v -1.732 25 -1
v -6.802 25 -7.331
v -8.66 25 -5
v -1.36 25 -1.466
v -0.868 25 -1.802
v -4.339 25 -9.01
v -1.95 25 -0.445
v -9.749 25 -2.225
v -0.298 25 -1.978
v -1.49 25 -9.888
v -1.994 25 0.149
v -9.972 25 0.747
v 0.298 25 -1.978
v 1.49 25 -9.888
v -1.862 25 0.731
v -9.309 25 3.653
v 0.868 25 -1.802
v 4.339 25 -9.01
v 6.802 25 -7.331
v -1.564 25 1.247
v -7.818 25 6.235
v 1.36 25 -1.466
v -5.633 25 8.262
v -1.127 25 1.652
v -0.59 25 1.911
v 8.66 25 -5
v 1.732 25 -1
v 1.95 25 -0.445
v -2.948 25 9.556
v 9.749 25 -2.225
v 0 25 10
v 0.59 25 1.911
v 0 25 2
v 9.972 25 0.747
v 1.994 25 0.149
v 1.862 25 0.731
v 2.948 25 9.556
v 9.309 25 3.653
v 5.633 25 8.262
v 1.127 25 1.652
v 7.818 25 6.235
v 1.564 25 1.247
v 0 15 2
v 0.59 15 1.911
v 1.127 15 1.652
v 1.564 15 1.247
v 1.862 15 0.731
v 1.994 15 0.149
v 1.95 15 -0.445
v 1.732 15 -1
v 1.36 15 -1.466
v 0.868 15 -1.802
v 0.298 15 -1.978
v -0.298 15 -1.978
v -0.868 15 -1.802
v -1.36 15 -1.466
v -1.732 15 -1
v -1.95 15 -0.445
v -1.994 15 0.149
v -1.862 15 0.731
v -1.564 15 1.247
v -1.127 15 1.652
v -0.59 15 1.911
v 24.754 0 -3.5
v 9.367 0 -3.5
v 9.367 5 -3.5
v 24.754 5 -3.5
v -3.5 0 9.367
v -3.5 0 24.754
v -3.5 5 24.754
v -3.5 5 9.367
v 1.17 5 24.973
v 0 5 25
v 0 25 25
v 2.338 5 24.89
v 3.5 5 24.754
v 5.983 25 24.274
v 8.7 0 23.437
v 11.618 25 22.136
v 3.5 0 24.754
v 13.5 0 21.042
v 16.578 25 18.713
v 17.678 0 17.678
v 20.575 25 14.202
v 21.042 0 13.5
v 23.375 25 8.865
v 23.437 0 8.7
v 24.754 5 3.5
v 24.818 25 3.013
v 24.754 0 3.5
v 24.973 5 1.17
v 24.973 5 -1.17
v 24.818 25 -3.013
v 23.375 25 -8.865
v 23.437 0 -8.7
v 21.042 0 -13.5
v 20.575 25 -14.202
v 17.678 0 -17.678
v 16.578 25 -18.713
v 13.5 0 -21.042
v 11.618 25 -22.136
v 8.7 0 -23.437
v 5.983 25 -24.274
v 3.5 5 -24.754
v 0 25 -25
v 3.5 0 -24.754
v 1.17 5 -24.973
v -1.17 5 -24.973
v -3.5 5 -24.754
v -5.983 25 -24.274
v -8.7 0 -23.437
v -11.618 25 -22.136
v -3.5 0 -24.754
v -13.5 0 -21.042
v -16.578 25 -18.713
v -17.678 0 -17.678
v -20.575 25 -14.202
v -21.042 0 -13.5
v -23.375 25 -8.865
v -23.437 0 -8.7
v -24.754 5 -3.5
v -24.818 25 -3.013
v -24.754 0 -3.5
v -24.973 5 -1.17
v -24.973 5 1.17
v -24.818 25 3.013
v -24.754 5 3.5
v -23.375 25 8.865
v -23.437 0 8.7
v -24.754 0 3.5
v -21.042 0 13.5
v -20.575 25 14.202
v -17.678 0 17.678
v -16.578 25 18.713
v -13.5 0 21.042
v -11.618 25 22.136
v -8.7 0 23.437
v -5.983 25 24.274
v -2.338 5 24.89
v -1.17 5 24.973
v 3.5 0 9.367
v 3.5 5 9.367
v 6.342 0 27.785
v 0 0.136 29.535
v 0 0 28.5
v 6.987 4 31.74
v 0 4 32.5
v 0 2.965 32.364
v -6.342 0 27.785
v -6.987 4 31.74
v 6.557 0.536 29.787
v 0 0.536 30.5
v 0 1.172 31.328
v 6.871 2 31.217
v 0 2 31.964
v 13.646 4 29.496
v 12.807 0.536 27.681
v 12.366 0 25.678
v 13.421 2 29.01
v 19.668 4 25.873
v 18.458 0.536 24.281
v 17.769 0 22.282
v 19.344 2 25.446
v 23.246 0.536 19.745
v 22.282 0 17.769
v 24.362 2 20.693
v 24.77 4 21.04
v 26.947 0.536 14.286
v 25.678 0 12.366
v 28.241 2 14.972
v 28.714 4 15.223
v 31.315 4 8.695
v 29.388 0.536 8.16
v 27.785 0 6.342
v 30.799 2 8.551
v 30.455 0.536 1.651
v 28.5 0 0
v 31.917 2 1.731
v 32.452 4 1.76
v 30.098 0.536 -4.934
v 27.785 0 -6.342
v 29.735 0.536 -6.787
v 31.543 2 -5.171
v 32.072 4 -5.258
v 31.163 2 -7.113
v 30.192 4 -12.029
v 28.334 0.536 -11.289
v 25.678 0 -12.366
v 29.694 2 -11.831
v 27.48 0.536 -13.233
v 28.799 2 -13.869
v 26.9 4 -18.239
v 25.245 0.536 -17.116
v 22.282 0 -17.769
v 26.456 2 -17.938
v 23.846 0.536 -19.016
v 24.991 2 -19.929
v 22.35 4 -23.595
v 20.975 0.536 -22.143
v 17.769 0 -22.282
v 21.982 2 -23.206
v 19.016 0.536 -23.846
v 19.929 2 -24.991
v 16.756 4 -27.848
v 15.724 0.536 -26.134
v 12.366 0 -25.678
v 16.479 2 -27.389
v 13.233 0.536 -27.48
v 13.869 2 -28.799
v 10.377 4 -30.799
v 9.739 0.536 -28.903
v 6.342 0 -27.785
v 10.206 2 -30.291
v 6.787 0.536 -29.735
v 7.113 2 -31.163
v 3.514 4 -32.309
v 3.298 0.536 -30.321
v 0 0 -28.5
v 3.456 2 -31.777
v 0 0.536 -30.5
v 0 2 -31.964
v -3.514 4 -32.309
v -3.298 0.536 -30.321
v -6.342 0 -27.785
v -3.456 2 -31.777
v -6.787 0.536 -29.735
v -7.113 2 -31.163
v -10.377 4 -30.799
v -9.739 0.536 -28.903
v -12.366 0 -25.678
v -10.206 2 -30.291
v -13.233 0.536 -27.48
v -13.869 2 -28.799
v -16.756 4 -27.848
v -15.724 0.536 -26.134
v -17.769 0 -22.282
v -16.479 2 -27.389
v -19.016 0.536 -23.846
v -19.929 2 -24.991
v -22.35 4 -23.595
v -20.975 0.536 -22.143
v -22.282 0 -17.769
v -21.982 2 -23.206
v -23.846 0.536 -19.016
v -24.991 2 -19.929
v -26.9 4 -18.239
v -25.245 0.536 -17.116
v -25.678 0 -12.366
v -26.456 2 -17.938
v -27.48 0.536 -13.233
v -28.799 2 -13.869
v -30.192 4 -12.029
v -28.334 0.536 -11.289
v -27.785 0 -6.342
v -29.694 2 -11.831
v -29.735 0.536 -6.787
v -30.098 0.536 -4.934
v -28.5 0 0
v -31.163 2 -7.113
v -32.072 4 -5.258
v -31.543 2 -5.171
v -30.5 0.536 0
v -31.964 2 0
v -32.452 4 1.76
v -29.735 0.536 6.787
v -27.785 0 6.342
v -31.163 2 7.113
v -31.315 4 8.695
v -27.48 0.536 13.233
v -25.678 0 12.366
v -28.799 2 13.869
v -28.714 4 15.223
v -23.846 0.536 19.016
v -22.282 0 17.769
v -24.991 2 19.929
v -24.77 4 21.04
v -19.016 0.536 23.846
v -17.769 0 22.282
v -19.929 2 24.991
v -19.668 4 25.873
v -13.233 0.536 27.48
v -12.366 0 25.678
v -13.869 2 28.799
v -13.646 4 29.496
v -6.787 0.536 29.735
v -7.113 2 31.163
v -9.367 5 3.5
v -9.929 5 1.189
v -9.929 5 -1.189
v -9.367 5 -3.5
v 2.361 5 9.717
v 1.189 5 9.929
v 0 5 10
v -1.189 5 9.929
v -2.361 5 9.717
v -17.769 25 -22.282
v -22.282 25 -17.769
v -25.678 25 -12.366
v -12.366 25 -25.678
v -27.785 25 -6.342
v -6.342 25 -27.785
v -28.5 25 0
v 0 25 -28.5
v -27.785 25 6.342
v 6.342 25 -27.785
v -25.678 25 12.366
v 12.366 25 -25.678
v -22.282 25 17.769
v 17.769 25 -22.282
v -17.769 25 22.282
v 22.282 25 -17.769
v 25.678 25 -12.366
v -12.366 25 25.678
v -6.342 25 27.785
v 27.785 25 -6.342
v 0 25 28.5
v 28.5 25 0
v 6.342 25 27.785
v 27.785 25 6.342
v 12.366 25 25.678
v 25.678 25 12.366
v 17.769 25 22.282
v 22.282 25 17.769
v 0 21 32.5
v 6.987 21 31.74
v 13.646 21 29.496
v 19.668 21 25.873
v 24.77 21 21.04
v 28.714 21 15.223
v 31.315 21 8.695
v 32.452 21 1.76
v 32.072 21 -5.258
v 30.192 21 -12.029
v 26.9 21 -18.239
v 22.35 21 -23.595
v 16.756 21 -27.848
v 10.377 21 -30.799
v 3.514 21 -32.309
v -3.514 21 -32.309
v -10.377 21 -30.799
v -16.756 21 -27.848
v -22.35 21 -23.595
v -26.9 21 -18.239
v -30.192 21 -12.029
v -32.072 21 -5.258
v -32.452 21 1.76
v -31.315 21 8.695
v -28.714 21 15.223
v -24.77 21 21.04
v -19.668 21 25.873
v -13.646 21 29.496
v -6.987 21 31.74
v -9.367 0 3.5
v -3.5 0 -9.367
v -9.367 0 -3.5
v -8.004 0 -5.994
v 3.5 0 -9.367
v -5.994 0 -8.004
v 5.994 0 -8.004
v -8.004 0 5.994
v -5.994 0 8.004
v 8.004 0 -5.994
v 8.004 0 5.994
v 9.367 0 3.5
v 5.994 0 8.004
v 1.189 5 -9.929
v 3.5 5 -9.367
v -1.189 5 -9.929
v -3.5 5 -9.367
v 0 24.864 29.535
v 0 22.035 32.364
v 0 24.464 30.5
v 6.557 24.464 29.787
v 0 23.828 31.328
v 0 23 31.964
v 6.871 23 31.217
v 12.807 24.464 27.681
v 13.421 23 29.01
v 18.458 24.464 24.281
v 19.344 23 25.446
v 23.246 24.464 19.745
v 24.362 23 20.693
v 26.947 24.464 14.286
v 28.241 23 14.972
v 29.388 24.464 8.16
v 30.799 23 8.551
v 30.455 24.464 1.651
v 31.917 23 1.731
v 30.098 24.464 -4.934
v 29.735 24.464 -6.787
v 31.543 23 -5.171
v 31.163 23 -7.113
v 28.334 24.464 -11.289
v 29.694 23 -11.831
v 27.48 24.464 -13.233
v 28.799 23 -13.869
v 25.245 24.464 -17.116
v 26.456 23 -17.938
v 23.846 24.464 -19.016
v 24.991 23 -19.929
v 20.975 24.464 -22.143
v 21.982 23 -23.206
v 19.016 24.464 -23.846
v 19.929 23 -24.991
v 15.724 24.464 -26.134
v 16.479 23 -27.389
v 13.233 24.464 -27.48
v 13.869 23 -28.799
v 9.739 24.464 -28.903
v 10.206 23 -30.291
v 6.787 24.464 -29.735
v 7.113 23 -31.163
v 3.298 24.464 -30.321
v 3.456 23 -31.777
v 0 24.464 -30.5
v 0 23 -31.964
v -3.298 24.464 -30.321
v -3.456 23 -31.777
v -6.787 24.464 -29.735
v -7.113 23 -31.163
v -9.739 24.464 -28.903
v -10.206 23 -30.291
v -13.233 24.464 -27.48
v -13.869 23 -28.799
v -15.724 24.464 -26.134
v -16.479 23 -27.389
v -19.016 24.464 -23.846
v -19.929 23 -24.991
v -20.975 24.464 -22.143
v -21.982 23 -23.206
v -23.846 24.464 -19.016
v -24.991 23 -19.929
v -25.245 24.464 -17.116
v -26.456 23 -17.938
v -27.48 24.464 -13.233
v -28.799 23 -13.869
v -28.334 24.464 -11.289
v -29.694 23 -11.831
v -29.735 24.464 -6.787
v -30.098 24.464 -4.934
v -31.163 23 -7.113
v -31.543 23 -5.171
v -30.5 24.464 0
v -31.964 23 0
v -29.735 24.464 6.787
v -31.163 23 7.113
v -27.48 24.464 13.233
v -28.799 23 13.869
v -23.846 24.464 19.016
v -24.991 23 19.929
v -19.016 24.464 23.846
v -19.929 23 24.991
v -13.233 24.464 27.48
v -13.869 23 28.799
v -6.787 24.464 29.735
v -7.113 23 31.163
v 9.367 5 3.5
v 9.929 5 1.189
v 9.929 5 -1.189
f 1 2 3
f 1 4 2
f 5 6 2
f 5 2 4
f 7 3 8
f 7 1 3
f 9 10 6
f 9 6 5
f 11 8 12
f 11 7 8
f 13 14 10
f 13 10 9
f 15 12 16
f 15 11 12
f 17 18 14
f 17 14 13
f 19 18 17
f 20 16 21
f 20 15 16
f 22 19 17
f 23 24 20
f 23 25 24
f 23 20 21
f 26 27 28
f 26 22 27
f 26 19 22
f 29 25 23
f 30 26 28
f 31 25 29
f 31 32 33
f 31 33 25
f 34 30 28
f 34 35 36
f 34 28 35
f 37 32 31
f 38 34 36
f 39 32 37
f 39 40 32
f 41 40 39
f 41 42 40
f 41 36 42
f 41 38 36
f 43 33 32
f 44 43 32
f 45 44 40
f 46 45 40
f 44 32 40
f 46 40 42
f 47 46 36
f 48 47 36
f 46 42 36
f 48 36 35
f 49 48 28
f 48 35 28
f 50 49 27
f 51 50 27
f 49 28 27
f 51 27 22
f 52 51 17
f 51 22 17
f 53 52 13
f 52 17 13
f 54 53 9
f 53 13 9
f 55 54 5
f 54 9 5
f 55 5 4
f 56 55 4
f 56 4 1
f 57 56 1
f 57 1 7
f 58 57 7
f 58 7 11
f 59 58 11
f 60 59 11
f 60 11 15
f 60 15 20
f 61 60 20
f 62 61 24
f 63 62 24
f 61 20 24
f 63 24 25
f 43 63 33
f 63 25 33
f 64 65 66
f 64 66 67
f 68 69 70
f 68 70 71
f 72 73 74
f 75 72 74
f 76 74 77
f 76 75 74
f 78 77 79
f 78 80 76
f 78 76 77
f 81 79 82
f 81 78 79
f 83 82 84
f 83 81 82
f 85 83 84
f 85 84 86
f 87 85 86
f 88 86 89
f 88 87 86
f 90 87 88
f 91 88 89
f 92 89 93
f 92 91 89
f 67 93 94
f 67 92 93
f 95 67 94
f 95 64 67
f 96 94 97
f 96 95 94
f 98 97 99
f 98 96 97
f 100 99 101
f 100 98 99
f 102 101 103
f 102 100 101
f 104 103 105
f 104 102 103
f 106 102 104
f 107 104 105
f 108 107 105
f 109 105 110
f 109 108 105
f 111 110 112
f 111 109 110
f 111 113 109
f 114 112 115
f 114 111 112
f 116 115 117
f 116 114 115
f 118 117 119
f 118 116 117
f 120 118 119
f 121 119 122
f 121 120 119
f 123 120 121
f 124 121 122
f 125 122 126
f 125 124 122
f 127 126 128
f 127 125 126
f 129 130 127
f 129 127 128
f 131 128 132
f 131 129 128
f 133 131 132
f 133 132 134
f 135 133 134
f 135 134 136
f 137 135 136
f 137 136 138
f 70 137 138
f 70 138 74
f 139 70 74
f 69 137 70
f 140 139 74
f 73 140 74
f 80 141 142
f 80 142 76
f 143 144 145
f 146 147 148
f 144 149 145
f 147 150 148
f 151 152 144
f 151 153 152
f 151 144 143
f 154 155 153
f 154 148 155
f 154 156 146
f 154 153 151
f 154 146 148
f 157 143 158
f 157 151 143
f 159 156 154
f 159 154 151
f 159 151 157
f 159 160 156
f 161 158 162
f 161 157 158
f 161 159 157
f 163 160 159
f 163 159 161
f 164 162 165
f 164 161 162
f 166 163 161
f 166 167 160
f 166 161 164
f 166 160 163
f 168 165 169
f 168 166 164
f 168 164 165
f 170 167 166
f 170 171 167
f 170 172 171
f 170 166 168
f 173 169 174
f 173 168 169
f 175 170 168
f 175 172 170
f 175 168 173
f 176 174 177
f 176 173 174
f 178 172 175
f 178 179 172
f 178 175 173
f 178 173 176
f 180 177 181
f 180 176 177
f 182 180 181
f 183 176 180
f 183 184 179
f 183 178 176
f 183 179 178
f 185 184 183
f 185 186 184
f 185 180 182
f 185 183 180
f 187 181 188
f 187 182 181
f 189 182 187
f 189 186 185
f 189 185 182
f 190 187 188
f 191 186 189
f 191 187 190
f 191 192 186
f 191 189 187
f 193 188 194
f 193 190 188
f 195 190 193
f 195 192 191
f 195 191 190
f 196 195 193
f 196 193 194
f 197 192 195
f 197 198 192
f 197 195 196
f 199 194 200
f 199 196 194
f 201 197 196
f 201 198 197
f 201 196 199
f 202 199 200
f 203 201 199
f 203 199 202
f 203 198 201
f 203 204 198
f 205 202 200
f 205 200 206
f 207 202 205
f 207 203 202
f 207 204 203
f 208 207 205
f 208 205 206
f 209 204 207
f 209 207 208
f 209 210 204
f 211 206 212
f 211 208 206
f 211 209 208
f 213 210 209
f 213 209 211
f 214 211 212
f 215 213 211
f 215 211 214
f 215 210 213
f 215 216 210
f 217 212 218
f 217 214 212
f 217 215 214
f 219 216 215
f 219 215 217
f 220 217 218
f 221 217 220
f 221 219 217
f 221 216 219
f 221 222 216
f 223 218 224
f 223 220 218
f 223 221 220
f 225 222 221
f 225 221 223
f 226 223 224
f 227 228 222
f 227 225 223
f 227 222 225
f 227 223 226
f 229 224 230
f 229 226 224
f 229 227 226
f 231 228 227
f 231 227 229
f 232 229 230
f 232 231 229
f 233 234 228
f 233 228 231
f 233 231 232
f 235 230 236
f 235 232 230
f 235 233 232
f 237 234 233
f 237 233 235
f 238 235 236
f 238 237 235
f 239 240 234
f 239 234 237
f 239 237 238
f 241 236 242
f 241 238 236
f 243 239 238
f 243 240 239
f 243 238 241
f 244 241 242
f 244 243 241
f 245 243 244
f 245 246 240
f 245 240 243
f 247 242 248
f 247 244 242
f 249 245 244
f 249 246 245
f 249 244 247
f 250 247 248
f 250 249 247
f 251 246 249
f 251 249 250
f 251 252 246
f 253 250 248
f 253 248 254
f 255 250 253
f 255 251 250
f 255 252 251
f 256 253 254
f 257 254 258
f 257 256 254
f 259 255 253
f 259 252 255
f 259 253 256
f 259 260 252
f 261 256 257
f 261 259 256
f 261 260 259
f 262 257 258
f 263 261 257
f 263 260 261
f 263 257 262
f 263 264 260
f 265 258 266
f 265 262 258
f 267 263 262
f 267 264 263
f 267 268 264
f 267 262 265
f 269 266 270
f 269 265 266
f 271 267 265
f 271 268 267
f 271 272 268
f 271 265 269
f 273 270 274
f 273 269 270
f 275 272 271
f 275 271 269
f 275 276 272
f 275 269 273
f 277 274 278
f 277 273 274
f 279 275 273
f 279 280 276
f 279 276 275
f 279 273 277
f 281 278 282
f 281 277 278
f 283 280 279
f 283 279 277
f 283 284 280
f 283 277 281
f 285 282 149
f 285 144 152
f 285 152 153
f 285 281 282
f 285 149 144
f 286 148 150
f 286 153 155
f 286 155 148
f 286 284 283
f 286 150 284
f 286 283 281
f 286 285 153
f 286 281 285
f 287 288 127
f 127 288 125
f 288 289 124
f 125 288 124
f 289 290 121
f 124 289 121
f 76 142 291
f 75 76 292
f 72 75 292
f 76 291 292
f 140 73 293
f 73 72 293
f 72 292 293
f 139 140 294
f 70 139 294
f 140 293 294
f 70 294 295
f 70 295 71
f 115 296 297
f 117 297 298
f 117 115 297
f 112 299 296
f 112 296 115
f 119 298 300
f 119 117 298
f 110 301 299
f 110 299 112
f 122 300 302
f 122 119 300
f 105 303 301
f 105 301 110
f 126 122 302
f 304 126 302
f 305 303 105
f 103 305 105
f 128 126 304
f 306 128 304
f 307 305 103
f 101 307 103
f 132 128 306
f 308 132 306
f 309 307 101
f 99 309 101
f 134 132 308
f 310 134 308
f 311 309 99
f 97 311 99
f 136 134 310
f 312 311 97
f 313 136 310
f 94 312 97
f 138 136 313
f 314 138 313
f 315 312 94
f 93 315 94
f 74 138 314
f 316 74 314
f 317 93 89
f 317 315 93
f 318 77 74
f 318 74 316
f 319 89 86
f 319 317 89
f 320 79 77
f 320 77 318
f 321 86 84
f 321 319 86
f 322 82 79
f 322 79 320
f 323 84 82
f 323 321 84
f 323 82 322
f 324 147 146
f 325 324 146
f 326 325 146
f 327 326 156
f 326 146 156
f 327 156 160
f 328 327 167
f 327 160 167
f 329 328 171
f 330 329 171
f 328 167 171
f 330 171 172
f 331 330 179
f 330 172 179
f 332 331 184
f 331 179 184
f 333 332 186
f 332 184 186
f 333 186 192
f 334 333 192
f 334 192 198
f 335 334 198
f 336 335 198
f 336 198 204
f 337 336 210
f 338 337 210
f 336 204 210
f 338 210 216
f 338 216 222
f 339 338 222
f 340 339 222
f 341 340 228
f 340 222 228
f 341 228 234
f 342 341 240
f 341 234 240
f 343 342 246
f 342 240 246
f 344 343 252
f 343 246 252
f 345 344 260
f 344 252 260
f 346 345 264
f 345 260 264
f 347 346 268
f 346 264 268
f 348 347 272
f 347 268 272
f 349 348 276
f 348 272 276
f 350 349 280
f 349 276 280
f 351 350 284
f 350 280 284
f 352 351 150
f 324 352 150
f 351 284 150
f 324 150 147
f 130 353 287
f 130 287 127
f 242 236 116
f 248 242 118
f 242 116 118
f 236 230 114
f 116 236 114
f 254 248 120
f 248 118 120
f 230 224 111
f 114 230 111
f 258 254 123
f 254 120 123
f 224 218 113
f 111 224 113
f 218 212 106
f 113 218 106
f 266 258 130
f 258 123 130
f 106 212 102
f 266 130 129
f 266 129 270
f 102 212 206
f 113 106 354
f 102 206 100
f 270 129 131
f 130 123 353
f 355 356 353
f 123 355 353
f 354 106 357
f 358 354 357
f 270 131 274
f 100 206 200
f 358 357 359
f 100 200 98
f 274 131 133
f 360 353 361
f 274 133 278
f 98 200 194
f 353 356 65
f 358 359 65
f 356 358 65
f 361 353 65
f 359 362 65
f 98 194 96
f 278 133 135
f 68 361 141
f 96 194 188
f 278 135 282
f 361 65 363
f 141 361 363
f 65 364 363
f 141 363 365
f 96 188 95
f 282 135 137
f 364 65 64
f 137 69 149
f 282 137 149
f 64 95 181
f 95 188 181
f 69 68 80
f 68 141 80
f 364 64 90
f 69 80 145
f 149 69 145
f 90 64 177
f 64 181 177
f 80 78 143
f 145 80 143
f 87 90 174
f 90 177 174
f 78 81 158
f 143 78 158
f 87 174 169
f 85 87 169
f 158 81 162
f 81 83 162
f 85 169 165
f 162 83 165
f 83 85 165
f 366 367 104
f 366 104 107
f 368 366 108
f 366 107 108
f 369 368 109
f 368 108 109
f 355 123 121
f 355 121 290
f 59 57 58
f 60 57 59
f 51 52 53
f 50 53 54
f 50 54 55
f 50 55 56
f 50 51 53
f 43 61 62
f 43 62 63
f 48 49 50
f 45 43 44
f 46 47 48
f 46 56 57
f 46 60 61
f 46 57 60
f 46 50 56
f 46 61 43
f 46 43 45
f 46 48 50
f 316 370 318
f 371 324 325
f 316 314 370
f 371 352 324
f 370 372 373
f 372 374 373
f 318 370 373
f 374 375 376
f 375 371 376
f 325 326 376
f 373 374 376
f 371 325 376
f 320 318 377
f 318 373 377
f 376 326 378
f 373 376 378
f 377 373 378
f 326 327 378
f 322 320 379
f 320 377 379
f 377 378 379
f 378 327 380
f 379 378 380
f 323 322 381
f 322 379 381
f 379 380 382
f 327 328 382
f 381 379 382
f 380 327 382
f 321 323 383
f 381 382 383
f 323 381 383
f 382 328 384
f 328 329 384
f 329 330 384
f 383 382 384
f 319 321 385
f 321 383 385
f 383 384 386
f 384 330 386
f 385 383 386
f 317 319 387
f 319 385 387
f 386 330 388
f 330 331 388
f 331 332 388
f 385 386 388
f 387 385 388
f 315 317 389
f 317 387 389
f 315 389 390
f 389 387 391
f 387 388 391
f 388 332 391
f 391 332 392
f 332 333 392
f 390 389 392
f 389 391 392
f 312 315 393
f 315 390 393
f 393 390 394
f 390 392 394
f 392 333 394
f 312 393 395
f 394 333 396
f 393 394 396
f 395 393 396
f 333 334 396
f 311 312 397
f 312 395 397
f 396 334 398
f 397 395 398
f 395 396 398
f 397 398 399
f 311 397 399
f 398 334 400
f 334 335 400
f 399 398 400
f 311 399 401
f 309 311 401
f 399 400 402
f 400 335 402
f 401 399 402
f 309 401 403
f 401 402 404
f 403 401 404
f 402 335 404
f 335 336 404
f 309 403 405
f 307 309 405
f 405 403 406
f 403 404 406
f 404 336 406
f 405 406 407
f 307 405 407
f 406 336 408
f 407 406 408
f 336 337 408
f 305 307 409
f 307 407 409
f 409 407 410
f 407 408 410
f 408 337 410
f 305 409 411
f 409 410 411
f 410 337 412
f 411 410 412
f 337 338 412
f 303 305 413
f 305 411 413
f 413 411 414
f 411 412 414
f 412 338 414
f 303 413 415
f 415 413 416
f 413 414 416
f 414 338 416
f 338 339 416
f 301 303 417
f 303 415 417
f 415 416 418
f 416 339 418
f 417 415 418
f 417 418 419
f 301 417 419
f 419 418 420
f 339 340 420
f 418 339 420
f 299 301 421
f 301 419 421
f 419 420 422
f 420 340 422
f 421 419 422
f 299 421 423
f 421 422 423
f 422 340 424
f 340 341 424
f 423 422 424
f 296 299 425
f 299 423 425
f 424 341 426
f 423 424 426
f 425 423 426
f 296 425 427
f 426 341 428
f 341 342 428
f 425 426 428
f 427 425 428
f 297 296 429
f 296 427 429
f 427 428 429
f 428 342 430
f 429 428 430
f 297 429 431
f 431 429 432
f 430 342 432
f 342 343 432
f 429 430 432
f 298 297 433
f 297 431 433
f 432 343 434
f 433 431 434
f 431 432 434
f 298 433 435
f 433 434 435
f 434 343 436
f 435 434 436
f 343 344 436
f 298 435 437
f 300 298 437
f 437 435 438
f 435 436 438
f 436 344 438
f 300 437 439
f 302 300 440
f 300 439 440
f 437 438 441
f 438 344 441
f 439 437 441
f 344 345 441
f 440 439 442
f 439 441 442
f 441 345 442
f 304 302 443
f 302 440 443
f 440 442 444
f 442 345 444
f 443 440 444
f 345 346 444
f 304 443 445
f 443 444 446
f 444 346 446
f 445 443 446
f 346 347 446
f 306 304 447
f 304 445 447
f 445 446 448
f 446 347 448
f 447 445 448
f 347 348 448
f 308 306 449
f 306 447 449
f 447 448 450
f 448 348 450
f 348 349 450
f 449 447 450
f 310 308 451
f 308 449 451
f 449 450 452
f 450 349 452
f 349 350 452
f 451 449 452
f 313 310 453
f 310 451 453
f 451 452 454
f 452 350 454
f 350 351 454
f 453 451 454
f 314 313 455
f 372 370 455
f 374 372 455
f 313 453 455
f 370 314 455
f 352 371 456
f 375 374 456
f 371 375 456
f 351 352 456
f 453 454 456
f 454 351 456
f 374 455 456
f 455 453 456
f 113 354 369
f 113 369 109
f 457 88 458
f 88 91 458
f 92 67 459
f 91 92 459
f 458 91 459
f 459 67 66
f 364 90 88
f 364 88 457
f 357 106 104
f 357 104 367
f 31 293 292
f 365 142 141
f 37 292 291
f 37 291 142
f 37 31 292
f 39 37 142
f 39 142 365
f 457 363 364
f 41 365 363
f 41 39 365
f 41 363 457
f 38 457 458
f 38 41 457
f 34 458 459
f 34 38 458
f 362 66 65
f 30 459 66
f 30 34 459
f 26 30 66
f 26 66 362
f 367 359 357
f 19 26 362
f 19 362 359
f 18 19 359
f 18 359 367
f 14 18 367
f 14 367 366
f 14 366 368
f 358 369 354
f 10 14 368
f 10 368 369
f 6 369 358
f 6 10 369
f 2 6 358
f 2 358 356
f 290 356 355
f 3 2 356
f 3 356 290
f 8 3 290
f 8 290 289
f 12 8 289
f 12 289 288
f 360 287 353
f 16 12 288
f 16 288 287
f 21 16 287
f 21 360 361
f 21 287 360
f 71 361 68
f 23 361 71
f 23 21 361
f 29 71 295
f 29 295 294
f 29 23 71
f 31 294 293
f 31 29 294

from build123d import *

# Parameters (mm, degrees)
SKETCH1_R           = 32.5
SKETCH1_R_2         = 25
BOSS_EXTRUDE1_DEPTH = 25
SKETCH2_R           = 10
BOSS_EXTRUDE3_DEPTH = 25
SKETCH4_R           = 2
CUT_EXTRUDE1_DEPTH  = 10
BOSS_EXTRUDE5_DEPTH = 5
FILLET4_R           = 4


with BuildPart() as part:
    # Sketch1 → Boss-Extrude1 (new body)
    with BuildSketch(Plane(origin=(0, 0, 0), x_dir=(1, 0, 0), z_dir=(0, 1, 0))):
        with Locations(Location((0, 0, 0), (0, 0, 270))):
            Circle(SKETCH1_R)
        with Locations(Location((0, 0, 0), (0, 0, 270))):
            Circle(SKETCH1_R_2, mode=Mode.SUBTRACT)
    extrude(amount=BOSS_EXTRUDE1_DEPTH)



with BuildPart() as body_2:
    # Sketch2 → Boss-Extrude3 (new body)
    with BuildSketch(Plane(origin=(0, 25, 0), x_dir=(1, 0, 0), z_dir=(0, 1, 0))):
        with Locations(Location((0, 0, 0), (0, 0, 270))):
            Circle(SKETCH2_R)
    extrude(amount=-BOSS_EXTRUDE3_DEPTH)

    # Sketch4 → Cut-Extrude1 (cut)
    with BuildSketch(Plane(origin=(0, 25, 0), x_dir=(1, 0, 0), z_dir=(0, 1, 0))):
        with Locations(Location((0, 0, 0), (0, 0, 270))):
            Circle(SKETCH4_R)
    extrude(amount=-CUT_EXTRUDE1_DEPTH, mode=Mode.SUBTRACT)


with BuildPart() as part_1:
    add(part.part)

    add(body_2.part)  # Boss-Extrude5 merges body 2
    # Sketch6 → Boss-Extrude5 (add)
    with BuildSketch(Plane(origin=(0, 0, 0), x_dir=(-1, 0, 0), z_dir=(0, -1, 0))):
        with BuildLine():
            Line((3.5, 3.5), (3.5, 25))
            ThreePointArc((3.5, 25), (0, 28.5), (-3.5, 25))
            Line((-3.5, 25), (-3.5, 3.5))
            Line((-3.5, 3.5), (3.5, 3.5))
        make_face()
        with BuildLine():
            Line((25, 3.5), (3.5, 3.5))
            Line((3.5, 3.5), (3.5, -3.5))
            Line((3.5, -3.5), (25, -3.5))
            ThreePointArc((25, -3.5), (28.5, 0), (25, 3.5))
        make_face()
        with BuildLine():
            Line((3.5, -25), (3.5, -3.5))
            Line((3.5, -3.5), (-3.5, -3.5))
            Line((-3.5, -3.5), (-3.5, -25))
            ThreePointArc((-3.5, -25), (0, -28.5), (3.5, -25))
        make_face()
        with BuildLine():
            Line((-3.5, -3.5), (-3.5, 3.5))
            Line((-3.5, 3.5), (-25, 3.5))
            ThreePointArc((-25, 3.5), (-28.5, 0), (-25, -3.5))
            Line((-25, -3.5), (-3.5, -3.5))
        make_face()
    extrude(amount=-BOSS_EXTRUDE5_DEPTH)

    # Fillet4
    fillet4_edges = [part_1.edges().sort_by_distance(p)[0] for p in [
        (0, 0, -32.5),
        (0, 25, -32.5),
    ]]
    fillet(fillet4_edges, radius=FILLET4_R)


solid = part_1.part
